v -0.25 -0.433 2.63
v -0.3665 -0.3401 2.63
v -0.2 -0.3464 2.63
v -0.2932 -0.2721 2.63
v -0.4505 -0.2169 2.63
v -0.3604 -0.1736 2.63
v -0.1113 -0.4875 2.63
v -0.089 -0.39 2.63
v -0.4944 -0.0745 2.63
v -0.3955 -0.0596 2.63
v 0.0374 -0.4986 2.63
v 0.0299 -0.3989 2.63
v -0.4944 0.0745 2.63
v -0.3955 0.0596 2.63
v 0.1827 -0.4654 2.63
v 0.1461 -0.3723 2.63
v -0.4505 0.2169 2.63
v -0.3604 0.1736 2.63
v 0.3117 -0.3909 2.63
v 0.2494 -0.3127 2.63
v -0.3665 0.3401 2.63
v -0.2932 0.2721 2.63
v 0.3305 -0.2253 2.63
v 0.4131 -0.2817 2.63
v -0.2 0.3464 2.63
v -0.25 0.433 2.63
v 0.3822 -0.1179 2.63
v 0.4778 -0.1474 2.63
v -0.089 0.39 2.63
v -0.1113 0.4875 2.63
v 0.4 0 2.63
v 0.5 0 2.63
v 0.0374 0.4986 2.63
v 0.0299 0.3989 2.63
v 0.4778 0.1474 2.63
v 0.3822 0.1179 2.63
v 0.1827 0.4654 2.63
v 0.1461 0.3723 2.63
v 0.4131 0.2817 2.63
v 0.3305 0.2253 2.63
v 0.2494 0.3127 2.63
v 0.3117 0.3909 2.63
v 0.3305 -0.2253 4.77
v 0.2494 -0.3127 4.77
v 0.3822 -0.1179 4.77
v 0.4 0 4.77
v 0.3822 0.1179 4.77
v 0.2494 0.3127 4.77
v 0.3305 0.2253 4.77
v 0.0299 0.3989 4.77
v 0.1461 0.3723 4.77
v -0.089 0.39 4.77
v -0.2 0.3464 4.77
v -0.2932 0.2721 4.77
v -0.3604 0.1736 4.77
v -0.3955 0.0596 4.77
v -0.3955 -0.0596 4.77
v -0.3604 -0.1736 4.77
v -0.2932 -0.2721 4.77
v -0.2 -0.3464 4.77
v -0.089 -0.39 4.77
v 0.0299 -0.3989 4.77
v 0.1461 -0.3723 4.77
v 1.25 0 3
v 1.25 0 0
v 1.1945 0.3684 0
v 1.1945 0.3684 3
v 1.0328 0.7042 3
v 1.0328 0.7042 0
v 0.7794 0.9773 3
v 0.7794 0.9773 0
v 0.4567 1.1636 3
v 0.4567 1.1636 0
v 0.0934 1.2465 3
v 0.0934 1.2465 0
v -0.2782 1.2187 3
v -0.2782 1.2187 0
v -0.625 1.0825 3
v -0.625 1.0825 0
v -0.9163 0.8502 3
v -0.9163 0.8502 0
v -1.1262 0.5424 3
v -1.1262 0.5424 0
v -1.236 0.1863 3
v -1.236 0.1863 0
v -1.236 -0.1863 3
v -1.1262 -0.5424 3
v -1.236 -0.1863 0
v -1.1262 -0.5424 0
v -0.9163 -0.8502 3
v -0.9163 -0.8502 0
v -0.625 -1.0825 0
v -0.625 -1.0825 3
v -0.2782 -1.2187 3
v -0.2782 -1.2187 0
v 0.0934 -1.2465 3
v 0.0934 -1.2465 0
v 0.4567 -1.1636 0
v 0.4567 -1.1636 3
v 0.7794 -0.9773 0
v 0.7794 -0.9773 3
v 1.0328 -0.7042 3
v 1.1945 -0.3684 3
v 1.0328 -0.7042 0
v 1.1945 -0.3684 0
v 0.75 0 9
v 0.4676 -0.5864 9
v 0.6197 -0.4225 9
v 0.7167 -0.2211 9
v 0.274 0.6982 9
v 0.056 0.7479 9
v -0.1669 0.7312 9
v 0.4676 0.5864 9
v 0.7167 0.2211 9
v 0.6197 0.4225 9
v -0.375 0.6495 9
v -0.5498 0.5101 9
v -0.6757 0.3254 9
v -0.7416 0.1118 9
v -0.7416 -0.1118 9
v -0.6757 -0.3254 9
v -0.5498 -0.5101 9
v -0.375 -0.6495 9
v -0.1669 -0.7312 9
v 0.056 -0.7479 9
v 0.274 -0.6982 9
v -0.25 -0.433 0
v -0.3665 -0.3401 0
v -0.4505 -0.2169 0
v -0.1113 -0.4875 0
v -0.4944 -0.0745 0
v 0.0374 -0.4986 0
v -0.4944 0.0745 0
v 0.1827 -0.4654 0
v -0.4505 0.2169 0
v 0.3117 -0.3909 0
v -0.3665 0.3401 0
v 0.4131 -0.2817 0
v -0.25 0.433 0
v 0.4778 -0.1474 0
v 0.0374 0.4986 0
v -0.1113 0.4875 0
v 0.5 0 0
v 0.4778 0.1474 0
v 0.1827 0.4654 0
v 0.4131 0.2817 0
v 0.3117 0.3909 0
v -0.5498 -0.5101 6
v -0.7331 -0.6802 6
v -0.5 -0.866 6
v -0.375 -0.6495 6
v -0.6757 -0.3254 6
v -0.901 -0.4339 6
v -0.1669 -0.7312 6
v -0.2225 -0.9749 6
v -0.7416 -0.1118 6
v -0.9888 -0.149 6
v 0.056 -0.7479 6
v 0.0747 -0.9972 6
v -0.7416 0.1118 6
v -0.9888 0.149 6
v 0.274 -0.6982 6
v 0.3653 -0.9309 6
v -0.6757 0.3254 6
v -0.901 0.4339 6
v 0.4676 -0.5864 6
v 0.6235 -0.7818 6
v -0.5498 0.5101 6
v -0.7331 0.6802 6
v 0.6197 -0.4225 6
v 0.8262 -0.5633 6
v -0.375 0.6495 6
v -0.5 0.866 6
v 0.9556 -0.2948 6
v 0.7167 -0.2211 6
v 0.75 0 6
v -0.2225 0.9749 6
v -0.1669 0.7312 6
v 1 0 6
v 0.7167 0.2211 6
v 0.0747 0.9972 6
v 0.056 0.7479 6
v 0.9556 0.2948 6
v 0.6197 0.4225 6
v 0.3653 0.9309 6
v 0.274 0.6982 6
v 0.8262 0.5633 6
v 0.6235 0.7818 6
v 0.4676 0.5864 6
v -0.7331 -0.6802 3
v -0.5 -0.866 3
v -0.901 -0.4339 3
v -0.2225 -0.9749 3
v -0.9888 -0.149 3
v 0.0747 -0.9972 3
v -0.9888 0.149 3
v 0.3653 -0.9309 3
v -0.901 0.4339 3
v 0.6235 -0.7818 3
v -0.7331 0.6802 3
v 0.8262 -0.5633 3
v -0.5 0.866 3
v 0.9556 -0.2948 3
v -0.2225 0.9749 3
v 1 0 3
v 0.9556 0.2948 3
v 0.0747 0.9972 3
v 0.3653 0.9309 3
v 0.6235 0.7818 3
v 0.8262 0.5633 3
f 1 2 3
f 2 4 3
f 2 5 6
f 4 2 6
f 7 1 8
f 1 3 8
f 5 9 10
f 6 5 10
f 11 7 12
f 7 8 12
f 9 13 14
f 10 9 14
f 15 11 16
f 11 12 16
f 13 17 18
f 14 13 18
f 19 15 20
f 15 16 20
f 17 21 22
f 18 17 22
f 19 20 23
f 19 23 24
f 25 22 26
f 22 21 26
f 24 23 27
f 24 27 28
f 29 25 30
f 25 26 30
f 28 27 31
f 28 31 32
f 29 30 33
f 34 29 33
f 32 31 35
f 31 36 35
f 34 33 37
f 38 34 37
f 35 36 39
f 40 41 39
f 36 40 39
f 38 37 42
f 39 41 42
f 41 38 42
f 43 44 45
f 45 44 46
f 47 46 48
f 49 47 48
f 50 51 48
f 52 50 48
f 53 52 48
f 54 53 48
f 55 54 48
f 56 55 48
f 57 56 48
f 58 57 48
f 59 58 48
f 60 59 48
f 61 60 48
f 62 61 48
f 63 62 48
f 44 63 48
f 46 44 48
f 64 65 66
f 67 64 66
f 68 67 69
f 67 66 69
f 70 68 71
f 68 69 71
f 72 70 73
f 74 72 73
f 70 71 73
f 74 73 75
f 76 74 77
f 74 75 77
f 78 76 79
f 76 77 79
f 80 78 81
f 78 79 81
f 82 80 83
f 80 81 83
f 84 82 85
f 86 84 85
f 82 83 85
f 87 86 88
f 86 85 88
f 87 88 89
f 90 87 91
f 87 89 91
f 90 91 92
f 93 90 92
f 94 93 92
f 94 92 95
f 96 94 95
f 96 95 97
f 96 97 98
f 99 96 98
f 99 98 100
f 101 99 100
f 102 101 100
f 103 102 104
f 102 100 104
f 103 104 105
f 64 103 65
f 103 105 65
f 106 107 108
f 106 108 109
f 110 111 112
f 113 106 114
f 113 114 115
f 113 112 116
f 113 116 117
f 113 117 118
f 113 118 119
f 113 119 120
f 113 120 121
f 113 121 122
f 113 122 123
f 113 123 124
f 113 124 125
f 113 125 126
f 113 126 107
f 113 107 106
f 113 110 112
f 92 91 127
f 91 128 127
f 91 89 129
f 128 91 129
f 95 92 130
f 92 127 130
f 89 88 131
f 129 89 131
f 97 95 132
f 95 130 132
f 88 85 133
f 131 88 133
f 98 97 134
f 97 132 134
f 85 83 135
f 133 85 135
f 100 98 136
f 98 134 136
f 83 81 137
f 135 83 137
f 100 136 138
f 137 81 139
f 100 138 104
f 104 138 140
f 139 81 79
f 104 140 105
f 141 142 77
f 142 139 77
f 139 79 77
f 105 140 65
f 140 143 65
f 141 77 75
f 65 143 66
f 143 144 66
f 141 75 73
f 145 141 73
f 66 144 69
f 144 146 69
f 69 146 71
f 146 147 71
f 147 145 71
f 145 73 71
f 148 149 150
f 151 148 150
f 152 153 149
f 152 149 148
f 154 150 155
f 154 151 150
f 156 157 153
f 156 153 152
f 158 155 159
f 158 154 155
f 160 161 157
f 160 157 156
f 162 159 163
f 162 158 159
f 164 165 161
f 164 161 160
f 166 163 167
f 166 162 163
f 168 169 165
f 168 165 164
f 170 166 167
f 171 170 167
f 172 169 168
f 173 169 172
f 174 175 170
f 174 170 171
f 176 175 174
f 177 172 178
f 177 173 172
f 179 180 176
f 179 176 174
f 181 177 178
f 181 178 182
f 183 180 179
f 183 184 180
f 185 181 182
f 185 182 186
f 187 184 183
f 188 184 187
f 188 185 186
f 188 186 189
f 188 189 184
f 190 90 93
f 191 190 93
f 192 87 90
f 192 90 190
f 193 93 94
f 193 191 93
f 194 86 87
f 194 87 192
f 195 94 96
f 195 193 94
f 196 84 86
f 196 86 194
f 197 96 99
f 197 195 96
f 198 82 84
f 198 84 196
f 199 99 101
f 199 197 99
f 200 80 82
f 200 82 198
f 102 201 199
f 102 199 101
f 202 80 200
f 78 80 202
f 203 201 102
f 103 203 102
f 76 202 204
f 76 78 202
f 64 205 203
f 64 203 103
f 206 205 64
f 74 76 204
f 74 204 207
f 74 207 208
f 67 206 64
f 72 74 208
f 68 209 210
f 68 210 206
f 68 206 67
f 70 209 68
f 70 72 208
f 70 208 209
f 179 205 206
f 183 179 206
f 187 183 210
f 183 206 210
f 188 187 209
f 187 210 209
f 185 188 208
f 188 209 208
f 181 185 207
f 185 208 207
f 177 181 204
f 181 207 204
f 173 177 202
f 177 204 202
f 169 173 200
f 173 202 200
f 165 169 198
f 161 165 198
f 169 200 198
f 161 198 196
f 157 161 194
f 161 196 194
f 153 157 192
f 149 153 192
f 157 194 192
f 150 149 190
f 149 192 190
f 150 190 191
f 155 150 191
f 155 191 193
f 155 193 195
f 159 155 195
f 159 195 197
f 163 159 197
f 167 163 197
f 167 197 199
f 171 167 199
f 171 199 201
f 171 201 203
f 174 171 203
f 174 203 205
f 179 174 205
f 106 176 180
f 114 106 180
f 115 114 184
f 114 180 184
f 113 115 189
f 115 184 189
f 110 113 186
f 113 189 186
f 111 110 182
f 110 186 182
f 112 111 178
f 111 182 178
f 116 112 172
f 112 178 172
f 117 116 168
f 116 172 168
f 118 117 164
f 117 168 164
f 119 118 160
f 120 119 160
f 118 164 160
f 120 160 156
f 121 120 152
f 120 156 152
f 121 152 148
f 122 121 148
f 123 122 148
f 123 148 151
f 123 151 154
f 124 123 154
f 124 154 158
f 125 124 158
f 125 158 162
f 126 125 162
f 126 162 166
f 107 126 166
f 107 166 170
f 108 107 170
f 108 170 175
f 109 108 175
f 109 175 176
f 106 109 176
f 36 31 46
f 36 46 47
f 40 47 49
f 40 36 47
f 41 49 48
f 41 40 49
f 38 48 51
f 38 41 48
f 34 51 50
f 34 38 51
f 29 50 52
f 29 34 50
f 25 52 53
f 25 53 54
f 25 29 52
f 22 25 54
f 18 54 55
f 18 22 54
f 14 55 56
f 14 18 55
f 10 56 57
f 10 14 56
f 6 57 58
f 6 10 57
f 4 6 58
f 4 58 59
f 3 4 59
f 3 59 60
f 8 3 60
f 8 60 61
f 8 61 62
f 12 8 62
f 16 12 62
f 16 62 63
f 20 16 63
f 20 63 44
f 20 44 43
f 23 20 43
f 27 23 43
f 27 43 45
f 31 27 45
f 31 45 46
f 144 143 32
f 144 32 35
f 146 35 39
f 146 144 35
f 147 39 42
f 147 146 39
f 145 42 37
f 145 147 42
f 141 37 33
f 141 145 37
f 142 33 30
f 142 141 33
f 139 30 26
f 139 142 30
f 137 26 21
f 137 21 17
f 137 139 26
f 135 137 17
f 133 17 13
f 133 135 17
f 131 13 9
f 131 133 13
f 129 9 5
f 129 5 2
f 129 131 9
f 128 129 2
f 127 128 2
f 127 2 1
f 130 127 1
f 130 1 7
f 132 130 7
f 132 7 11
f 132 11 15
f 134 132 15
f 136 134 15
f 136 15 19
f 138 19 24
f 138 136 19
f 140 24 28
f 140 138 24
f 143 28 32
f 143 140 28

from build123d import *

# Parameters (mm, degrees)
F1_R      = 1
F2_DEPTH  = 6
F0_R      = 0.75
F3_DEPTH  = 9
F5_R      = 1.25
F6_DEPTH  = 3
F4_R      = 0.4
F7_DEPTH  = 2.36
F8_R      = 0.5
F9_DEPTH  = 2.63
F10_R     = 0.4
F11_DEPTH = 4.77


with BuildPart() as f2:
    # F1 (on Top) → F2 (new body)
    with BuildSketch(Plane.XY):
        Circle(F1_R)
    extrude(amount=F2_DEPTH)

    # F0 (on Top) → F3 (join)
    with BuildSketch(Plane.XY):
        Circle(F0_R)
    extrude(amount=F3_DEPTH)

    # F5 (on Top) → F6 (join)
    with BuildSketch(Plane.XY):
        Circle(F5_R)
    extrude(amount=F6_DEPTH)

    # F4 (on Top) → F7 (cut)
    with BuildSketch(Plane.XY):
        Circle(F4_R)
    extrude(amount=F7_DEPTH, mode=Mode.SUBTRACT)

    # F8 (on Top) → F9 (cut)
    with BuildSketch(Plane.XY):
        Circle(F8_R)
    extrude(amount=F9_DEPTH, mode=Mode.SUBTRACT)

    # F10 (on Top) → F11 (cut)
    with BuildSketch(Plane.XY):
        Circle(F10_R)
    extrude(amount=F11_DEPTH, mode=Mode.SUBTRACT)


solid = f2.part
